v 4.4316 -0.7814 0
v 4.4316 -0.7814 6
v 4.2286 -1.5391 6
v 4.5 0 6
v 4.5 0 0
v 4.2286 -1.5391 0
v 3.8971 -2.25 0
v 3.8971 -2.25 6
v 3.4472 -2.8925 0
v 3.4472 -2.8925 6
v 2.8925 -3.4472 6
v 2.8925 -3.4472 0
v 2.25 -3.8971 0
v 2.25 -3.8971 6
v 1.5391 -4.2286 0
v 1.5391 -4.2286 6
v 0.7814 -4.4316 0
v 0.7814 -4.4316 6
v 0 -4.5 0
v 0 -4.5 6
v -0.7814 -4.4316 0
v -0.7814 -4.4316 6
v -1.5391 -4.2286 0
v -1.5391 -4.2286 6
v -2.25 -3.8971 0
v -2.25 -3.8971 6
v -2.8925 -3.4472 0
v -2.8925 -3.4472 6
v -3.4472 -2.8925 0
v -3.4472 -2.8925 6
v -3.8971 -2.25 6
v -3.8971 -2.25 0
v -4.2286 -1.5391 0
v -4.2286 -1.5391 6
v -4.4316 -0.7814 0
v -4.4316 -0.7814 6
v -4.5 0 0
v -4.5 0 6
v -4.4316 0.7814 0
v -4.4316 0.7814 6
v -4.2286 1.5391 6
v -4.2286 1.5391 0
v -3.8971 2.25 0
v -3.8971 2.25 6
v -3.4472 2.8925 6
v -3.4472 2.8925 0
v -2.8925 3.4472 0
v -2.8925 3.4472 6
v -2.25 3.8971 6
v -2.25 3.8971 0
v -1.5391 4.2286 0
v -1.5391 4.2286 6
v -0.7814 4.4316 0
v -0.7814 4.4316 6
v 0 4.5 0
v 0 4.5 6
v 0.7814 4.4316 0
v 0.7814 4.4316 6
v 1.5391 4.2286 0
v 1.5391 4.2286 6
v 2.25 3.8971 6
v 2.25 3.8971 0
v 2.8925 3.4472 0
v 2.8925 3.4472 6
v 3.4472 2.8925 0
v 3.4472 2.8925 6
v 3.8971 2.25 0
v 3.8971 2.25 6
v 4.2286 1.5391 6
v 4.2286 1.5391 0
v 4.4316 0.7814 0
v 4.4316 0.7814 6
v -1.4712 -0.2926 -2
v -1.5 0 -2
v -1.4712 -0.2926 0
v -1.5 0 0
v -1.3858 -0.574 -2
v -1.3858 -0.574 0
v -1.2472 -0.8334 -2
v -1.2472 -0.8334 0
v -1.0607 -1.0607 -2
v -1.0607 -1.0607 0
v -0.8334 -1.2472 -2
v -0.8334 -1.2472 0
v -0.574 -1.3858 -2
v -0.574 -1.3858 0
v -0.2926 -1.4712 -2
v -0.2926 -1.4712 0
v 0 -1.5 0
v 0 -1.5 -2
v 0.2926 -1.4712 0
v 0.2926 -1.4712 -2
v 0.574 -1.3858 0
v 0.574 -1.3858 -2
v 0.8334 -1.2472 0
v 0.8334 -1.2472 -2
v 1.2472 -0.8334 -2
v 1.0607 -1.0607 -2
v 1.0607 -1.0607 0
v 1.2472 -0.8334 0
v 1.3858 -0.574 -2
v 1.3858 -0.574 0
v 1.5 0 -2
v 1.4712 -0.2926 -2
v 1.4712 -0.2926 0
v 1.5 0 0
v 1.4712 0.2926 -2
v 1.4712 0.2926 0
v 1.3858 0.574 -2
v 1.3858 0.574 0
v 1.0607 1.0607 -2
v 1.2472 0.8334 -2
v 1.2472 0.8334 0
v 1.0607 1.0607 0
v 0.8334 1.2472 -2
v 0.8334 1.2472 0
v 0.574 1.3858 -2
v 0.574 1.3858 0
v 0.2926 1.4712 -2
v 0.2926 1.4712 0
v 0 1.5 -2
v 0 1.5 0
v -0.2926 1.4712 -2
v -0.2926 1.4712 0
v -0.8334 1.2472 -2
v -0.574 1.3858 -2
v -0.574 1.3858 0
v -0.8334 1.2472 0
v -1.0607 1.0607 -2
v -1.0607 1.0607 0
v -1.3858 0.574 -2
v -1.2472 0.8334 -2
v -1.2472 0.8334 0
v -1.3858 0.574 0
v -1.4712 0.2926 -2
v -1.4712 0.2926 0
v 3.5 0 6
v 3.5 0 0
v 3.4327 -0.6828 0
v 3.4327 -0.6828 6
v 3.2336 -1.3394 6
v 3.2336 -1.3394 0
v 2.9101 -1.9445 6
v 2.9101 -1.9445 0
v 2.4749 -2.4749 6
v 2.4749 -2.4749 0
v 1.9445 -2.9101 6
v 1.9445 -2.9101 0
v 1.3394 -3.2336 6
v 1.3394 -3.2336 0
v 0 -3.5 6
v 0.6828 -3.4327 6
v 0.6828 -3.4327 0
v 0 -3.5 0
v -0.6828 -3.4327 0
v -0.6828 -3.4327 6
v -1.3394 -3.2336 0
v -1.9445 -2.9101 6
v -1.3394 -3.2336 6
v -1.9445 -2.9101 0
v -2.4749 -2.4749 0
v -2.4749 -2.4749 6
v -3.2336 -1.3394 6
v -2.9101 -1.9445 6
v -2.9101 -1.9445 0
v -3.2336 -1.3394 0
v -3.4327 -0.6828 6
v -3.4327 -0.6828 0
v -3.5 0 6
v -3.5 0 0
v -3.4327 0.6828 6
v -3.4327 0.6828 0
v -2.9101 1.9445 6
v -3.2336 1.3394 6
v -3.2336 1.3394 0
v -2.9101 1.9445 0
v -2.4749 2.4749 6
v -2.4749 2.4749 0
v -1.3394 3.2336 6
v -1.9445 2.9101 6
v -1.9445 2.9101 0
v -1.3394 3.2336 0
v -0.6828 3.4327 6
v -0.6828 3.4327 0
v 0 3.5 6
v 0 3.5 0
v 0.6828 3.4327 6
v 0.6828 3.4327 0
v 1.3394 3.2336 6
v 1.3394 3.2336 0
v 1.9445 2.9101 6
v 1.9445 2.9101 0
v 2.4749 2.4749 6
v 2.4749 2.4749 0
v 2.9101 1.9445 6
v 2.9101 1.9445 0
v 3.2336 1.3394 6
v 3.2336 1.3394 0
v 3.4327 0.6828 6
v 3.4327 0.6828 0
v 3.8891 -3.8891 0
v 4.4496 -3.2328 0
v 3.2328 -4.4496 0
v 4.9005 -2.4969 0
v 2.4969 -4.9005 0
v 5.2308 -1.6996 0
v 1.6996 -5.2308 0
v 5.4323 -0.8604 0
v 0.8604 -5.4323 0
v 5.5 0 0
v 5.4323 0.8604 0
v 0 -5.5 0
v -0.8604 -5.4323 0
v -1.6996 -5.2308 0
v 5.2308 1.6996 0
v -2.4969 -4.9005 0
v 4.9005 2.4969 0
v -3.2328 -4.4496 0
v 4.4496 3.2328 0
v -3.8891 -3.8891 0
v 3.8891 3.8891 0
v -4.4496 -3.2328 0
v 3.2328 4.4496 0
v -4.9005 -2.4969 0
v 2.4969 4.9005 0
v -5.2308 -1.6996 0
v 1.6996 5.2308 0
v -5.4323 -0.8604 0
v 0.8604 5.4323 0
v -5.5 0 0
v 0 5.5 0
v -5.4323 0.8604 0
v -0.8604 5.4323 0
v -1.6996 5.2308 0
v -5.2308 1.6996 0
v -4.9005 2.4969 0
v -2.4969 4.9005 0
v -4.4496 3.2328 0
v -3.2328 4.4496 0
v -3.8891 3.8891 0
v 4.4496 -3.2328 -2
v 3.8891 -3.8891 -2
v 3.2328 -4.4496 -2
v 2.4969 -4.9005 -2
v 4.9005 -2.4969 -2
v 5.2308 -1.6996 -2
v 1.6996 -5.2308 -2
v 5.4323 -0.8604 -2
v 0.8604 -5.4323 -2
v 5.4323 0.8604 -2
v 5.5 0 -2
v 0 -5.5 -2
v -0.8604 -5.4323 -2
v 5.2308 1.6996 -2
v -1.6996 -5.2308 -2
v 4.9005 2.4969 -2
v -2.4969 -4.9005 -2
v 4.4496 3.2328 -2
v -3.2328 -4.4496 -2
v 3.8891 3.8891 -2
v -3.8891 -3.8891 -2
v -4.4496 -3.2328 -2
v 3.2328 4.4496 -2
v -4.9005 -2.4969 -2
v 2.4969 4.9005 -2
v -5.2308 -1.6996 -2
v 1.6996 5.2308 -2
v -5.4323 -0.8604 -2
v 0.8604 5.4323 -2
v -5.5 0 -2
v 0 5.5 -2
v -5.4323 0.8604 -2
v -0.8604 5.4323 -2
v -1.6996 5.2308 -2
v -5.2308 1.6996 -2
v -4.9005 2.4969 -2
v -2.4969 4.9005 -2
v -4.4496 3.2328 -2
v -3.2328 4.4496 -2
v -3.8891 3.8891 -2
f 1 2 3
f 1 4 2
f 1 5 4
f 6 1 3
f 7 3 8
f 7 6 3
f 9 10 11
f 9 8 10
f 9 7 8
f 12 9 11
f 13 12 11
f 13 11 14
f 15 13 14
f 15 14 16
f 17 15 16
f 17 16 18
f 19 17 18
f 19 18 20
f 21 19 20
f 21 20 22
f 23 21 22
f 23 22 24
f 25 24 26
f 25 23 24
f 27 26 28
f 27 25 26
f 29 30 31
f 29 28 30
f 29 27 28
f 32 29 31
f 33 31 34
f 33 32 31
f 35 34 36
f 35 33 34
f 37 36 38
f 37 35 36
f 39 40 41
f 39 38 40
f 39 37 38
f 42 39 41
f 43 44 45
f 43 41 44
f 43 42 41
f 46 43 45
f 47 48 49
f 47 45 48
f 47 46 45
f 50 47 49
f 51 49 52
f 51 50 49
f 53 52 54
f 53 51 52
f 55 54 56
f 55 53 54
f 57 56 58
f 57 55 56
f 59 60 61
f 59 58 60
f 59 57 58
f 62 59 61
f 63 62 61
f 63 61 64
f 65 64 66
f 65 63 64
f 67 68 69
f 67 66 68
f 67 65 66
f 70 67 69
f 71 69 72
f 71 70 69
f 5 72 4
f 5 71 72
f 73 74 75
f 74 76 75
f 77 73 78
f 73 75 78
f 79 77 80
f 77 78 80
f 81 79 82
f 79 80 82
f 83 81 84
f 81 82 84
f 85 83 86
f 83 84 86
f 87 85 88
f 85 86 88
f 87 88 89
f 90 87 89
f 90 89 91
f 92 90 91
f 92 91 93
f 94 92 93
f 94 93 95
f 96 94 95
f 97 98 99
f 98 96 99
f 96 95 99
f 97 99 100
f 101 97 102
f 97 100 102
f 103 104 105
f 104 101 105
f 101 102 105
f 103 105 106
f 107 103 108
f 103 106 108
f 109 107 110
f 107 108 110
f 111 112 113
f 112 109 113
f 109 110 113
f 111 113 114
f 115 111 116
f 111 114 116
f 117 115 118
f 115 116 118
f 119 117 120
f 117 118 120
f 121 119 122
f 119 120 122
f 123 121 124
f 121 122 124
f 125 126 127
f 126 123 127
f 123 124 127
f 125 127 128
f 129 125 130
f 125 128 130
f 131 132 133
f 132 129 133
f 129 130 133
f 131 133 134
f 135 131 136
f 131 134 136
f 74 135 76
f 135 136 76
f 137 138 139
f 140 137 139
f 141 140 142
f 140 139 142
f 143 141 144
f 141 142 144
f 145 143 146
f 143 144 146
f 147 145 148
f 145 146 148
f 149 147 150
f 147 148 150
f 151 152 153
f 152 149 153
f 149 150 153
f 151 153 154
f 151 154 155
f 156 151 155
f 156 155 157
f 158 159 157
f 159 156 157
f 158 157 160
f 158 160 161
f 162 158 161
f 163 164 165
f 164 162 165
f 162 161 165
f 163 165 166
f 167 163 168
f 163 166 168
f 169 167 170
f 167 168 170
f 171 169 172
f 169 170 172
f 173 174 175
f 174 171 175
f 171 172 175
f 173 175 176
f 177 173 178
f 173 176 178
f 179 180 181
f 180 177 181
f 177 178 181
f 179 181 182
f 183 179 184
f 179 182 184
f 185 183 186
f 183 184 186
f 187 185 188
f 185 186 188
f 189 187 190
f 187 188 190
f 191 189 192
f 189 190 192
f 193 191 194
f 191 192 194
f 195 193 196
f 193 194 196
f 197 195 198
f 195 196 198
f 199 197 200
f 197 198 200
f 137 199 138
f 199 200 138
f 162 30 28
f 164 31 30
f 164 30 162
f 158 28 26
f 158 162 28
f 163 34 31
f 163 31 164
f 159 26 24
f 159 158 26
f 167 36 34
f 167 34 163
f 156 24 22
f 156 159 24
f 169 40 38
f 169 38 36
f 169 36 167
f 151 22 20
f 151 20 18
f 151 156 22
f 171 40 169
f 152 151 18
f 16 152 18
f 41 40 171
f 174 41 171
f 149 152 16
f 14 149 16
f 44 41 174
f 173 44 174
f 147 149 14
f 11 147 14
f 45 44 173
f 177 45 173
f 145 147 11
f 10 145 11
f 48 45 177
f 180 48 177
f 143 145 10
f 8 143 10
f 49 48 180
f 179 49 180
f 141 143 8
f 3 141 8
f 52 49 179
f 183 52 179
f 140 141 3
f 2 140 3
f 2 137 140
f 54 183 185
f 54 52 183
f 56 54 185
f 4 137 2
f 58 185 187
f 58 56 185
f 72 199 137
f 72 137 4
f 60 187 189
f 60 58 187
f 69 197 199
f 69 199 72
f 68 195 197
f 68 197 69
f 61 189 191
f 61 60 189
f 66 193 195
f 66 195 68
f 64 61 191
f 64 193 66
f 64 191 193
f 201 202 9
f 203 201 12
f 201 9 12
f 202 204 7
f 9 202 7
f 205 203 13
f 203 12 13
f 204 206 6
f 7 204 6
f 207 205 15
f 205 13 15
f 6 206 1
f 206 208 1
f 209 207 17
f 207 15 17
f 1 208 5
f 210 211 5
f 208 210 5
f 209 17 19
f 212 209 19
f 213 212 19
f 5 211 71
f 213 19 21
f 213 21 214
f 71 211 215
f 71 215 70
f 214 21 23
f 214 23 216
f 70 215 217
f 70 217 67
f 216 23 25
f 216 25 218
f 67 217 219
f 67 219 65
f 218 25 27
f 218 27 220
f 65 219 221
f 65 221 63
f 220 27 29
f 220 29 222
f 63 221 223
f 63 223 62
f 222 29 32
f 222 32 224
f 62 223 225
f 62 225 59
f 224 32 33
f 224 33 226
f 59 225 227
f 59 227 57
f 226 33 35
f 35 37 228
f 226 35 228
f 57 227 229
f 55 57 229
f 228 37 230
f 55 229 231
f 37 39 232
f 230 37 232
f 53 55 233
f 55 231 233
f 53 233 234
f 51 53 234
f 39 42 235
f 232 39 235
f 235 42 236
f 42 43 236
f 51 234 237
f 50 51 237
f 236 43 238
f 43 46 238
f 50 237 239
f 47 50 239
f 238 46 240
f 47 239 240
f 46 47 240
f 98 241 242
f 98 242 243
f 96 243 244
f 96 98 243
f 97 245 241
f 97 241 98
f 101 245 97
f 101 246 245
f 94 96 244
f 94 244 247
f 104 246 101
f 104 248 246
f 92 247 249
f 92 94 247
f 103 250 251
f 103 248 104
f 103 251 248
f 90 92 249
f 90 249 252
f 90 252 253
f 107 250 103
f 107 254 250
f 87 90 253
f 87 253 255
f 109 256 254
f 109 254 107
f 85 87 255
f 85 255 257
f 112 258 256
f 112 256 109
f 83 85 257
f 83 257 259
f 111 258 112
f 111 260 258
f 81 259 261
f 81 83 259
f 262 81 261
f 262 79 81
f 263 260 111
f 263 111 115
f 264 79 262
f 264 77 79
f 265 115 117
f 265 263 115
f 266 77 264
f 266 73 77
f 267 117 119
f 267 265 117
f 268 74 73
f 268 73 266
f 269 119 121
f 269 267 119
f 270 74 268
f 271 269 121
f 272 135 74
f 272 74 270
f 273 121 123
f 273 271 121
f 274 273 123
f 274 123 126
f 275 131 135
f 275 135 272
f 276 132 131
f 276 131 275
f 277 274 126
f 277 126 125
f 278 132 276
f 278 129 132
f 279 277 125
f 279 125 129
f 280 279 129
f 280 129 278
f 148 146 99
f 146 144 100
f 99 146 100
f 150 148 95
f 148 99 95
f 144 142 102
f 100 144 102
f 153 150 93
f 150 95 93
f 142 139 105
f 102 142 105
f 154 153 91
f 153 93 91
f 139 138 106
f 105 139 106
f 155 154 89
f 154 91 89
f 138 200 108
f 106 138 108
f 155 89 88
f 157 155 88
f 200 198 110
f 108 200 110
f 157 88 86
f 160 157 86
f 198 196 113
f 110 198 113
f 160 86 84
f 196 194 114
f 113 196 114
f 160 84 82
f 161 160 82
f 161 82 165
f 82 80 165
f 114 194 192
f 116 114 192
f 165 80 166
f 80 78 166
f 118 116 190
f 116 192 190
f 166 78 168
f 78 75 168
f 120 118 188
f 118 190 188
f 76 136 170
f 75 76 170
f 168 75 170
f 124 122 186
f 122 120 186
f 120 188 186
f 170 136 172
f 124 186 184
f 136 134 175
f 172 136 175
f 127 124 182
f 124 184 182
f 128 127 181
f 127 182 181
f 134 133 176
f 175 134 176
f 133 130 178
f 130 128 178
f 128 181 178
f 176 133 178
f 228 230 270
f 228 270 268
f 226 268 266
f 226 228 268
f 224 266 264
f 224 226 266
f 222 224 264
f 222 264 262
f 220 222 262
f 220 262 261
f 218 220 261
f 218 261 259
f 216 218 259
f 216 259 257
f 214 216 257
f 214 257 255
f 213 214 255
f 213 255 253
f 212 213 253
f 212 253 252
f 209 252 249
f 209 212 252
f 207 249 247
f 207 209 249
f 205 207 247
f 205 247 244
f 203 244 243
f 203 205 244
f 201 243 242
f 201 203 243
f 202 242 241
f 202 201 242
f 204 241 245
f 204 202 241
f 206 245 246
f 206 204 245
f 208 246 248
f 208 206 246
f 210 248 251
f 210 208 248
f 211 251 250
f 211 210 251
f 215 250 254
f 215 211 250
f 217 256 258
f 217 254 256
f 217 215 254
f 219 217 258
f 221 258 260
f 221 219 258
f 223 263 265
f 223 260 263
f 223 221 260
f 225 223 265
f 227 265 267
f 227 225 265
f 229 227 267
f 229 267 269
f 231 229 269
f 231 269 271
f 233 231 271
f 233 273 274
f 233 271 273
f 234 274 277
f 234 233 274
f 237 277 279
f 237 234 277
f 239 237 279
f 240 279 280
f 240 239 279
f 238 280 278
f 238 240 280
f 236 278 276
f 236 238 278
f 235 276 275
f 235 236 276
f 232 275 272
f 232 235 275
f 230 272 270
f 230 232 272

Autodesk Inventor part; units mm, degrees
ref_plane "YZ Plane" through (0, 0, 0) normal (1, 0, 0) x (0, 1, 0)
ref_plane "XZ Plane" through (0, 0, 0) normal (0, 1, 0) x (-1, 0, 0)
ref_plane "XY Plane" through (0, 0, 0) normal (0, 0, 1) x (1, 0, 0)
sketch "Sketch1" plane through (0, 0, 0) normal (0, 0, 1) x (1, 0, 0)
  circle A0 centre (0, 0) radius 3.5
  circle A1 centre (0, 0) radius 4.5
  dimension "d0" = 7
  dimension "d1" = 9
extrude "Extrusion1" add sketch "Sketch1" along normal blind 6
sketch "Sketch2" plane through (0, 0, 0) normal (0, 0, -1) x (-1, 0, 0)
  circle A0 centre (0, 0) radius 1.5
  circle A1 centre (0, 0) radius 5.5
  dimension "d4" = 3
  dimension "d5" = 11
extrude "Extrusion2" add sketch "Sketch2" along normal blind 2
properties part number "cork"
